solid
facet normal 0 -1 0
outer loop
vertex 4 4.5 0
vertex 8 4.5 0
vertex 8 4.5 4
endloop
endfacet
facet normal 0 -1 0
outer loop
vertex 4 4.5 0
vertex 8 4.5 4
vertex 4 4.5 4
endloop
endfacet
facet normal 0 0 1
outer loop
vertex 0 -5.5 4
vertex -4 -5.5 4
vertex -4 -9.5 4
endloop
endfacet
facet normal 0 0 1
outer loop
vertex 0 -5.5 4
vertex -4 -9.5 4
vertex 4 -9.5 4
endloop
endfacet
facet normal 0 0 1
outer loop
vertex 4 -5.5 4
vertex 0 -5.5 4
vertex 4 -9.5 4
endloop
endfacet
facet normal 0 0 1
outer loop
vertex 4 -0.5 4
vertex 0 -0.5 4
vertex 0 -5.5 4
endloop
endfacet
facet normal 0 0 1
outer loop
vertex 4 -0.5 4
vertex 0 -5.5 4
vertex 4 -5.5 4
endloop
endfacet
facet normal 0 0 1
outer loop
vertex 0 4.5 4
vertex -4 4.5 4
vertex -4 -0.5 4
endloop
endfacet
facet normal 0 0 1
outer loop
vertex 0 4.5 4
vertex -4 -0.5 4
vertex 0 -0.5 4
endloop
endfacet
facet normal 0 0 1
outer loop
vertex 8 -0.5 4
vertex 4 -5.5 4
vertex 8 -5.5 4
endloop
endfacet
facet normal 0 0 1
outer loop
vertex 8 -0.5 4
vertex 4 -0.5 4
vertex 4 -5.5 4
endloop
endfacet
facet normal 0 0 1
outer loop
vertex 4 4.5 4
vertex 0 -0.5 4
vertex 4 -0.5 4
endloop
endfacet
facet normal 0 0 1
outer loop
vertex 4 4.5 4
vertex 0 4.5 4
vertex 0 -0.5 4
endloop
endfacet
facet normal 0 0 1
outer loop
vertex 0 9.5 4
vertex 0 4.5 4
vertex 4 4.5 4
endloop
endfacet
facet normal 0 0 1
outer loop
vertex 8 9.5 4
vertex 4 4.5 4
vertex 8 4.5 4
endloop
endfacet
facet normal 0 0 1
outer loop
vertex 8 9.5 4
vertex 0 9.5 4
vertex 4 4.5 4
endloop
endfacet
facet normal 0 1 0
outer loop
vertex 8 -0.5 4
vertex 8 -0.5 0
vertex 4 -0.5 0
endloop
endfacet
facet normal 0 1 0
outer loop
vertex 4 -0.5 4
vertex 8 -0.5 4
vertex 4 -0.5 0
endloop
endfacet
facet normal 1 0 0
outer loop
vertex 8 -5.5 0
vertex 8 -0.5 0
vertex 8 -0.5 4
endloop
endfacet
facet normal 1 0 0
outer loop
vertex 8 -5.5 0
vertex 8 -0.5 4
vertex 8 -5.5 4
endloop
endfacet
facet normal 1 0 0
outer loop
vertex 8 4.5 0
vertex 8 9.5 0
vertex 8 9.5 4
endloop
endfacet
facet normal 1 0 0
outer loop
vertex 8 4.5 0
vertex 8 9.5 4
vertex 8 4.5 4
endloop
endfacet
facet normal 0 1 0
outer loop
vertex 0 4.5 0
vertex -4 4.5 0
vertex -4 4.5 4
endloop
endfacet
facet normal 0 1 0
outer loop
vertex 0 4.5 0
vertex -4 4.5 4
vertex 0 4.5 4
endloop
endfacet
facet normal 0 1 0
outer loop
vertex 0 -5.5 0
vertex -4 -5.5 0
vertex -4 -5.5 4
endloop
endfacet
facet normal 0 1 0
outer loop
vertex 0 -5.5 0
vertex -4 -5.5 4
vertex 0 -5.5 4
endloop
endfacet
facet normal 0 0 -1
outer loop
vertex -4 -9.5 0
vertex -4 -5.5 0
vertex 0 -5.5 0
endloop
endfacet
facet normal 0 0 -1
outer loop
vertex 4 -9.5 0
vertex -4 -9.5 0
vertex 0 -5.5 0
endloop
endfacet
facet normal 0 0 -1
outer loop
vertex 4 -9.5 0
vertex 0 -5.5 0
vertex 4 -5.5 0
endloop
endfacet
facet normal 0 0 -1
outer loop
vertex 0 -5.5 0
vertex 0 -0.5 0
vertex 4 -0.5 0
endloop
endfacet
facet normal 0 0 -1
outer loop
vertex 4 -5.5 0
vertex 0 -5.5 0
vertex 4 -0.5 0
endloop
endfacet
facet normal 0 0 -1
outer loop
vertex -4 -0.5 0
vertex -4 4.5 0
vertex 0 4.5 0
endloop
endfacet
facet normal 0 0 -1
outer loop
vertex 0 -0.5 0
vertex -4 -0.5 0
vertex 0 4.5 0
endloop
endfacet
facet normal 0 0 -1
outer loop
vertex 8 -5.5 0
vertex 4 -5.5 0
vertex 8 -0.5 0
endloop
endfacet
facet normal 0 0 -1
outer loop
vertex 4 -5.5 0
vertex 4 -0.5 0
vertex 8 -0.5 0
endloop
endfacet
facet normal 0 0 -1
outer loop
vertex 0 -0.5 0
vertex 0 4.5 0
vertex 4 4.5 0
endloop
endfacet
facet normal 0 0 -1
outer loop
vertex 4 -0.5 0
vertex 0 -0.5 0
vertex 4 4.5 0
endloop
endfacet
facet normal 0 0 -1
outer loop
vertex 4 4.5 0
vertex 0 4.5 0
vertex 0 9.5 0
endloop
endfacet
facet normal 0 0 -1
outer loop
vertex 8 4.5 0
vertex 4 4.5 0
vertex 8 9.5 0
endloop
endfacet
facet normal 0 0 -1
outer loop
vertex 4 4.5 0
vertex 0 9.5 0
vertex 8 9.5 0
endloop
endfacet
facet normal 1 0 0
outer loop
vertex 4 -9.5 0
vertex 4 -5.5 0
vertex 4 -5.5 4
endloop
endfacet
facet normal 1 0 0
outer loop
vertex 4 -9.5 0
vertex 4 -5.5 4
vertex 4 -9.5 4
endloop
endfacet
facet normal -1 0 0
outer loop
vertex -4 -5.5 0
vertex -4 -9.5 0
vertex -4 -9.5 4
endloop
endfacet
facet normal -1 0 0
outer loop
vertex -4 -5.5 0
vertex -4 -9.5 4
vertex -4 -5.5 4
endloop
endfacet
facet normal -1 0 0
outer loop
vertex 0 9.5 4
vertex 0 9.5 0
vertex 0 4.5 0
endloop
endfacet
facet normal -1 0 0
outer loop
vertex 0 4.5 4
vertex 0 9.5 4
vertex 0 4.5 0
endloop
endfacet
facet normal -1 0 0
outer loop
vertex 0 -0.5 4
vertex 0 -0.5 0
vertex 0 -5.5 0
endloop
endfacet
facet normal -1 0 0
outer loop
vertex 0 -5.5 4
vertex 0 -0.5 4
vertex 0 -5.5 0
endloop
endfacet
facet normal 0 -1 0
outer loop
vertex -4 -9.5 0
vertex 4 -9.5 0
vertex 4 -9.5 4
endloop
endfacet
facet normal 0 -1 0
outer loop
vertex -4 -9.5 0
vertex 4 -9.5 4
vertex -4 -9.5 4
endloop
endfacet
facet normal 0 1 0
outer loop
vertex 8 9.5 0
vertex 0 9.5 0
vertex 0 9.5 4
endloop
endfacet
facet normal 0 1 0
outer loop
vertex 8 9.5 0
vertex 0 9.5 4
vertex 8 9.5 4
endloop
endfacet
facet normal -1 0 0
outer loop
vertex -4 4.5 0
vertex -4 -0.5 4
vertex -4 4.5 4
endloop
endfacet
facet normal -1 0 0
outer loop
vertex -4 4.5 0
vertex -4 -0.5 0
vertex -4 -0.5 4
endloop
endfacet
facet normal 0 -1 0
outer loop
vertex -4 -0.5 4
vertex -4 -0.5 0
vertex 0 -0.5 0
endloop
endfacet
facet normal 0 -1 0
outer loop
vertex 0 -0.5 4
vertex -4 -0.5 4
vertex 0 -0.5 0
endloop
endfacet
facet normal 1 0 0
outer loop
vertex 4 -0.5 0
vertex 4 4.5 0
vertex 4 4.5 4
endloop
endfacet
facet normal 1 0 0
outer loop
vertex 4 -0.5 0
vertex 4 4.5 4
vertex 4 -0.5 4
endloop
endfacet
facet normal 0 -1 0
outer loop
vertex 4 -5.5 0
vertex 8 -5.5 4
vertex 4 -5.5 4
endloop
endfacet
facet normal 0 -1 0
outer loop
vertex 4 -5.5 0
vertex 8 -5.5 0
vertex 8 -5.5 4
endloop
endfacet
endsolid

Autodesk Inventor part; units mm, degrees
ref_plane "YZ Plane" through (0, 0, 0) normal (1, 0, 0) x (0, 1, 0)
ref_plane "XZ Plane" through (0, 0, 0) normal (0, 1, 0) x (-1, 0, 0)
ref_plane "XY Plane" through (0, 0, 0) normal (0, 0, 1) x (1, 0, 0)
sketch "Sketch1" plane through (0, 0, 0) normal (0, 0, 1) x (1, 0, 0)
  line L0 (-4, 9.5) -> (4, 9.5)
  line L1 (4, 9.5) -> (4, -9.5)
  line L2 (4, -9.5) -> (-4, -9.5)
  line L3 (-4, -9.5) -> (-4, 9.5)
  line L4 (-4, 9.5) -> (4, -9.5) construction
  line L5 (4, 9.5) -> (-4, -9.5) construction
  line L6 (4, 9.5) -> (8, 9.5)
  line L7 (8, 9.5) -> (8, 4.5)
  line L8 (8, 4.5) -> (4, 4.5)
  line L9 (4, 4.5) -> (4, 9.5)
  line L10 (8, -0.5) -> (4, -0.5)
  line L11 (8, 4.5) -> (8, -0.5)
  line L12 (8, -5.5) -> (4, -5.5)
  line L13 (8, -0.5) -> (8, -5.5)
  line L14 (2, 14.112) -> (2, 5.4586)
  line L15 (0, 9.5) -> (0, -9.5)
  line L16 (0, 9.5) -> (-4, 9.5)
  line L17 (-4, 9.5) -> (-4, 4.5)
  line L18 (-4, 4.5) -> (0, 4.5)
  line L19 (-4, -0.5) -> (0, -0.5)
  line L20 (-4, 4.5) -> (-4, -0.5)
  line L21 (-4, -0.5) -> (-4, -9.5)
  line L22 (-4, -5.5) -> (0, -5.5)
  point P0 (0, 0)
  point P1 (0, 4.5)
  point P2 (-4, 4.5)
  point P3 (-4, -0.5)
  point P4 (4, -7)
  point P5 (8, -0.5)
  point P6 (0, 9.5)
  point P7 (8, 4.5)
  point P8 (4, -5.5)
  point P9 (0, -5.5)
  point P10 (-4, -5.5)
  dimension "d0" = 8
  dimension "d1" = 19
  dimension "d2" = 4
  dimension "d3" = 5
  dimension "d6" = 5
  dimension "d11" = 12
  dimension "d12" = 6
extrude "Extrusion1" add sketch "Sketch1" along normal blind 4 contours L0 L1 L2 L15 | L18 L15 L19 L3 | L6 L7 L8 L1 | L22 L15 L2 L3 | L10 L13 L12 L1
sketch "Sketch2" plane through (0, 0, 4) normal (0, 0, 1) x (1, 0, 0)
  line L0 (0, -5.5) -> (-4, -5.5) projected
  line L1 (-4, -5.5) -> (-4, -9.5) projected
  line L2 (-4, -9.5) -> (4, -9.5) projected
  line L3 (4, -9.5) -> (4, -5.5) projected
  line L4 (4, -5.5) -> (8, -5.5) projected
  line L5 (8, -5.5) -> (8, -0.5) projected
  line L6 (8, -0.5) -> (4, -0.5) projected
  line L7 (4, -0.5) -> (4, 4.5) projected
  line L8 (4, 4.5) -> (8, 4.5) projected
  line L9 (8, 4.5) -> (8, 9.5) projected
  line L10 (8, 9.5) -> (0, 9.5) projected
  line L11 (0, 9.5) -> (0, 4.5) projected
  line L12 (0, 4.5) -> (-4, 4.5) projected
  line L13 (-4, 4.5) -> (-4, -0.5) projected
  line L14 (-4, -0.5) -> (0, -0.5) projected
  line L15 (0, -0.5) -> (0, -5.5) projected
  point P0 (0, 0)
equation "\"d1\" = height + e"
equation "\"d2\" = e"
equation "\"d3\" = 0.333333 * height"
equation "\"d6\" = d3"
equation "\"d12\" = 0.5 * d11"
equation "\"d13\" = e"
equation "\"e\" = 4"
equation "\"height\" = 15"
properties part number "wall2" material "MDF Medium Density Fiberboard"
